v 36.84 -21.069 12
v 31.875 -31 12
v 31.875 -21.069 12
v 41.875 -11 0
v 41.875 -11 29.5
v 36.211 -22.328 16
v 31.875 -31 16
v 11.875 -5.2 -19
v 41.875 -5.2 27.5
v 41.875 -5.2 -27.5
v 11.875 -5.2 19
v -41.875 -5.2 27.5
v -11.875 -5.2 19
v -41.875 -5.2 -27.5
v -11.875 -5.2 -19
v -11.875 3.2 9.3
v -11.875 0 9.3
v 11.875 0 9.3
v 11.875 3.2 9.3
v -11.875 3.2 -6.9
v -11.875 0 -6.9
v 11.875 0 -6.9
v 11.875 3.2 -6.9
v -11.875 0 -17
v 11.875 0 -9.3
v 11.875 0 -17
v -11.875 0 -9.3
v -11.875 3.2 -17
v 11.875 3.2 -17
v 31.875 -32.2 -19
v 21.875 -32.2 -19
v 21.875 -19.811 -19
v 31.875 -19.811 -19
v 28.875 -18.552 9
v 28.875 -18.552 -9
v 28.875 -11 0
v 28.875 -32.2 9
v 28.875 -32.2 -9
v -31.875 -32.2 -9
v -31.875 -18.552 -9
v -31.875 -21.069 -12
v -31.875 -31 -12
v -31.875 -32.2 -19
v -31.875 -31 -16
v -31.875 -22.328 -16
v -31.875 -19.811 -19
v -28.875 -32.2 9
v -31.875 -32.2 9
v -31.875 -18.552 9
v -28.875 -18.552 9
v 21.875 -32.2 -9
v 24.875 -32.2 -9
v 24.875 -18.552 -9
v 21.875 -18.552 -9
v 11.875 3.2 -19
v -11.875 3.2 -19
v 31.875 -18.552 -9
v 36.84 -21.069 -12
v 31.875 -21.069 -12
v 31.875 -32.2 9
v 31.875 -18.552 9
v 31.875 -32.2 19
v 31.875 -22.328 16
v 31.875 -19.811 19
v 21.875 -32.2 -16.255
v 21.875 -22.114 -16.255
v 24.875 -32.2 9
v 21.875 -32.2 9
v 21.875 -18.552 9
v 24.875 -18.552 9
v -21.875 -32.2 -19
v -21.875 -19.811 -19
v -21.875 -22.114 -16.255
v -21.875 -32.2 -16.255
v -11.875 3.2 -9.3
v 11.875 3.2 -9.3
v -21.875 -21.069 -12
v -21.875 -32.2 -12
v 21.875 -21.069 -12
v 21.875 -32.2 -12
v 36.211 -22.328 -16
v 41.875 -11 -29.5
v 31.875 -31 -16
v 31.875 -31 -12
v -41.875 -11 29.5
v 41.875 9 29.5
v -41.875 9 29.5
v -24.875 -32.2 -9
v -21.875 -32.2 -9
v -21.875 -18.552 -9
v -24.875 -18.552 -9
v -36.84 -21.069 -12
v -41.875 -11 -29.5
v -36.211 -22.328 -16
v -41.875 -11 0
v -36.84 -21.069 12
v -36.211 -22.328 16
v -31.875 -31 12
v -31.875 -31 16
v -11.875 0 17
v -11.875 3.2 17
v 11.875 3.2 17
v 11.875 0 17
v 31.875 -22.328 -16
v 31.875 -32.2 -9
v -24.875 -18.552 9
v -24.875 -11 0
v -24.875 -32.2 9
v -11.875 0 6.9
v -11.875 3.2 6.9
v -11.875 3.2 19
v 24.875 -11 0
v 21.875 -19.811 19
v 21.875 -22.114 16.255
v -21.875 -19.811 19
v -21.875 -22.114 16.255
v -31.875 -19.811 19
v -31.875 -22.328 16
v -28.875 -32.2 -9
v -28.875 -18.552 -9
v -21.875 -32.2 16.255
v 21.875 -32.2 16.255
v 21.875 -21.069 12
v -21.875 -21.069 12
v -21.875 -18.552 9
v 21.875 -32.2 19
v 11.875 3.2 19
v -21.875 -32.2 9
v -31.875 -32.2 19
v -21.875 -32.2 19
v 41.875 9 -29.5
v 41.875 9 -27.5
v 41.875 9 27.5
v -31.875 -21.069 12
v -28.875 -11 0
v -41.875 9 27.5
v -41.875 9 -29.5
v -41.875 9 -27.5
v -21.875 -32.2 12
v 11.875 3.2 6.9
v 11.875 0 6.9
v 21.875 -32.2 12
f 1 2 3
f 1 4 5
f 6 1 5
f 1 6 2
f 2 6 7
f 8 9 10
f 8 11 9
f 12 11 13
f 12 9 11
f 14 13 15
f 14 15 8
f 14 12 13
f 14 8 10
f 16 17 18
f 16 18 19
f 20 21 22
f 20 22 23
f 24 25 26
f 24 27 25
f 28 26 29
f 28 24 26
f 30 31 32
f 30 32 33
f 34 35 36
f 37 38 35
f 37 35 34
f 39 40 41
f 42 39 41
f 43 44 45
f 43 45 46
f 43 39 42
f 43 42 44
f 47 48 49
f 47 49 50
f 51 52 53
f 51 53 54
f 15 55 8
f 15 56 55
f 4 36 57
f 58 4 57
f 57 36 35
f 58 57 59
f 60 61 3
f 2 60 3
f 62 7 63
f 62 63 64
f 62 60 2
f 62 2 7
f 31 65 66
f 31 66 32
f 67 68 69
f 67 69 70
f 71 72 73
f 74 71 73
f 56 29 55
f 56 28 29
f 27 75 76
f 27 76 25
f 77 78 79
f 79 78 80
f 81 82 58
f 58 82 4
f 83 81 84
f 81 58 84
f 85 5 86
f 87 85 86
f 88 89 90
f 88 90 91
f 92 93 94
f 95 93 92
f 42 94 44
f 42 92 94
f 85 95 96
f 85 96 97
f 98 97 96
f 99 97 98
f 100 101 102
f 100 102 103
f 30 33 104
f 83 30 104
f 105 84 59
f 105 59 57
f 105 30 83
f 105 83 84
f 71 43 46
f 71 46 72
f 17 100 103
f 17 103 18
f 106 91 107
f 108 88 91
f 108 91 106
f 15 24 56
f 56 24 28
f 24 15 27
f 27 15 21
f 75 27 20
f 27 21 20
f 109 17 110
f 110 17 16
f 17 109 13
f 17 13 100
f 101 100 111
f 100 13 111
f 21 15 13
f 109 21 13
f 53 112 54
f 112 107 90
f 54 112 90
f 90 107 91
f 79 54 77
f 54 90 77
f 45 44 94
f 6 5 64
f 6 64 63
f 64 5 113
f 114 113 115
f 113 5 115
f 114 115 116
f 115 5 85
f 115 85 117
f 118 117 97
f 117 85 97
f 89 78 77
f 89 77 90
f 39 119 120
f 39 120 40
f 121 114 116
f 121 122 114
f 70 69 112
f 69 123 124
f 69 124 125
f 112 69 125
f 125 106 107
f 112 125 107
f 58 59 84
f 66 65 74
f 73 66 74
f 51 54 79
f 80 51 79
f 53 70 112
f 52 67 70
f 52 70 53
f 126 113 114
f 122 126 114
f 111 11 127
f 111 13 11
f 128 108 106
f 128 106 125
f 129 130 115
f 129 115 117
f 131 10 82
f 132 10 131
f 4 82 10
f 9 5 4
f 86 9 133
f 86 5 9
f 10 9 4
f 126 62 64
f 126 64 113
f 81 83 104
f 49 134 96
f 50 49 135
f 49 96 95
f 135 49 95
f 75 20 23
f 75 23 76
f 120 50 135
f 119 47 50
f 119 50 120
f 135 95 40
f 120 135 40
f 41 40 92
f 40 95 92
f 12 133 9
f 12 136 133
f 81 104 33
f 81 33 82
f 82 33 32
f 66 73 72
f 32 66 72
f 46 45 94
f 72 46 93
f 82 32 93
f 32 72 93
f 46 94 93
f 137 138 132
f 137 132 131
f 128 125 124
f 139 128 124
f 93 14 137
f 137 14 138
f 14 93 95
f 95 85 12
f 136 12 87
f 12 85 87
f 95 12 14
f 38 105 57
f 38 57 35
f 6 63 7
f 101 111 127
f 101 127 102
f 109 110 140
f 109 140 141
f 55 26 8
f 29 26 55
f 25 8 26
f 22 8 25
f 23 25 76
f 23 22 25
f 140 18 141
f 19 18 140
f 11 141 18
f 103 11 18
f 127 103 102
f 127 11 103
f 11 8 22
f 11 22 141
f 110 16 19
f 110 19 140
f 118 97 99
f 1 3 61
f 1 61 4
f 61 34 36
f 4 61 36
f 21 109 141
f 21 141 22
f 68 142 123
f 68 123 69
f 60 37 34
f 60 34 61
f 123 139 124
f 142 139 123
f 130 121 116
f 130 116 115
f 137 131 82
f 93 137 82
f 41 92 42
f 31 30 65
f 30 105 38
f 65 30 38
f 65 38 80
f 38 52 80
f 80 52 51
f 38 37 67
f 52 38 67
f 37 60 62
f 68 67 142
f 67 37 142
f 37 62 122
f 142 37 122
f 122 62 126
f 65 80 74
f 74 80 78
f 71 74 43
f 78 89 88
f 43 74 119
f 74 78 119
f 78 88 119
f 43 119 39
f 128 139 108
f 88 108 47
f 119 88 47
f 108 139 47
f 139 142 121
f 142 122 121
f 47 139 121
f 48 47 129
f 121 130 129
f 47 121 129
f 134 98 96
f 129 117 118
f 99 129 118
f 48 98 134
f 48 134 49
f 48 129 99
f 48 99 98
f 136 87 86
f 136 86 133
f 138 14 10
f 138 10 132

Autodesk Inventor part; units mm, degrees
ref_plane "YZ Plane" through (0, 0, 0) normal (1, 0, 0) x (0, 1, 0)
ref_plane "XY Plane" through (0, 0, 0) normal (0, 0, 1) x (1, 0, 0)
sketch "スケッチ1" plane through (0, 0, 0) normal (1, 0, 0) x (0, 1, 0)
  line L0 (0, 41.3) -> (0, -41.3) projected
  line L1 (-39, 0) -> (17, 0) projected
  line L2 (-5.2, 19) -> (3.2, 19)
  line L3 (3.2, 19) -> (3.2, 17)
  line L4 (3.2, 17) -> (0, 17)
  line L5 (0, 17) -> (0, 9.3)
  line L6 (0, 9.3) -> (3.2, 9.3)
  line L7 (3.2, 9.3) -> (3.2, 6.9)
  line L8 (3.2, 6.9) -> (0, 6.9)
  line L9 (0, 6.9) -> (0, -6.9)
  line L10 (0, -6.9) -> (3.2, -6.9)
  line L11 (3.2, -6.9) -> (3.2, -9.3)
  line L12 (3.2, -9.3) -> (0, -9.3)
  line L13 (0, -9.3) -> (0, -17)
  line L14 (0, -17) -> (3.2, -17)
  line L15 (3.2, -17) -> (3.2, -19)
  line L16 (3.2, -19) -> (-5.2, -19)
  line L17 (-5.2, -19) -> (-5.2, 19)
  line L18 (-5.2, 27.5) -> (-5.2, -27.5)
  line L19 (-5.2, -27.5) -> (9, -27.5)
  line L20 (9, -27.5) -> (9, -29.5)
  line L21 (9, -29.5) -> (-11, -29.5)
  line L22 (-11, -29.5) -> (-11, 29.5)
  line L23 (-11, 29.5) -> (9, 29.5)
  line L24 (9, 29.5) -> (9, 27.5)
  line L25 (9, 27.5) -> (-5.2, 27.5)
  line L26 (-11, 29.5) -> (-22.3278, 16)
  line L27 (-22.3278, 16) -> (-31, 16)
  line L28 (-31, 16) -> (-31, 12)
  line L29 (-31, 12) -> (-21.0692, 12)
  line L30 (-21.0692, 12) -> (-11, 0)
  line L31 (-11, 0) -> (-21.0692, -12)
  line L32 (-21.0692, -12) -> (-31, -12)
  line L33 (-31, -12) -> (-31, -16)
  line L34 (-31, -16) -> (-22.3278, -16)
  line L35 (-22.3278, -16) -> (-11, -29.5)
  point P0 (0, 0)
  dimension "d0" = 38
  dimension "d1" = 18.6
  dimension "d2" = 2
  dimension "d3" = 2.4
  dimension "d4" = 3.2
  dimension "d5" = 8.4
  dimension "d6" = 59
  dimension "d7" = 2
  dimension "d8" = 20
  dimension "d9" = 5.8
  dimension "d10" = 5.8
  dimension "d11" = 40
  dimension "d12" = 40
  dimension "d13" = 32
  dimension "d14" = 4
  dimension "d15" = 20
extrude "押し出し1" add sketch "スケッチ1" along normal mid plane 23.75 contours L0 L1 L17 L2 | L0 L2 L3 L4 | L6 L7 L8 L0 | L0 L16 L17 L1 | L10 L11 L12 L0 | L0 L14 L15 L16
extrude "押し出し2" add sketch "スケッチ1" along normal mid plane 83.75 contours L25 L18 L17 L1 L22 L23 L0 | L0 L23 L24 L25 | L17 L18 L19 L0 L21 L22 L1 | L22 L30 L29 L28 L27 L26 | L22 L35 L34 L33 L32 L31 | L0 L19 L20 L21
ref_plane "作業平面1" through (0, -32.2, 0) normal (0, 1, 0) x (-1, 0, 0)
sketch "スケッチ2" plane through (0, -32.2, 0) normal (0, 1, 0) x (-1, 0, 0)
  line L0 (0, -41.3) -> (0, 41.3) projected
  line L1 (-58.625, 0) -> (58.625, 0) projected
  line L2 (31.875, -19) -> (21.875, -19)
  line L3 (21.875, -19) -> (21.875, -9)
  line L4 (21.875, -9) -> (31.875, -9)
  line L5 (31.875, -9) -> (31.875, -19)
  line L6 (-21.875, -19) -> (-31.875, -19)
  line L7 (-31.875, -19) -> (-31.875, -9)
  line L8 (-31.875, -9) -> (-21.875, -9)
  line L9 (-21.875, -9) -> (-21.875, -19)
  line L10 (31.875, 9) -> (21.875, 9)
  line L11 (21.875, 9) -> (21.875, 19)
  line L12 (21.875, 19) -> (31.875, 19)
  line L13 (31.875, 19) -> (31.875, 9)
  line L14 (-21.875, 9) -> (-31.875, 9)
  line L15 (-31.875, 9) -> (-31.875, 19)
  line L16 (-31.875, 19) -> (-21.875, 19)
  line L17 (-21.875, 19) -> (-21.875, 9)
  line L18 (-21.875, 16.2551) -> (21.875, 16.2551)
  line L19 (21.875, 16.2551) -> (21.875, 12)
  line L20 (21.875, 12) -> (-21.875, 12)
  line L21 (-21.875, 12) -> (-21.875, 16.2551)
  line L22 (21.875, -12) -> (-21.875, -12)
  line L23 (-21.875, -12) -> (-21.875, -16.2551)
  line L24 (-21.875, -16.2551) -> (21.875, -16.2551)
  line L25 (21.875, -16.2551) -> (21.875, -12)
  line L26 (-28.875, 9) -> (-24.875, 9)
  line L27 (-24.875, 9) -> (-24.875, -9)
  line L28 (-24.875, -9) -> (-28.875, -9)
  line L29 (-28.875, -9) -> (-28.875, 9)
  line L30 (24.875, 9) -> (28.875, 9)
  line L31 (28.875, 9) -> (28.875, -9)
  line L32 (28.875, -9) -> (24.875, -9)
  line L33 (24.875, -9) -> (24.875, 9)
  point P0 (0, 0)
  dimension "d21" = 38
  dimension "d23" = 53.75
  dimension "d24" = 10
  dimension "d25" = 10
  dimension "d28" = 3
  dimension "d29" = 3
  dimension "d30" = 3
  dimension "d31" = 2.7449
extrude "押し出し3" add sketch "スケッチ2" along normal up to next contours L24 L9 L22 L0 | L0 L22 L3 L24 | L9 L6 L7 L8 | L3 L4 L5 L2 | L20 L17 L18 L0 | L0 L18 L11 L20 | L27 L8 L29 L1 | L1 L29 L14 L27 | L33 L10 L31 L1 | L1 L31 L4 L33 | L11 L12 L13 L10 | L17 L14 L15 L16
sketch "スケッチ3" plane through (0, 0, 0) normal (0, 0, 1) x (1, 0, 0)
  line L0 (-41.875, -11) -> (-31.875, -31)
  line L1 (-31.875, -31) -> (-41.875, -31)
  line L2 (-41.875, -31) -> (-41.875, -11)
  line L3 (0, 17.24) -> (0, -40.44) projected
  line L4 (41.875, -11) -> (31.875, -31)
  line L5 (31.875, -31) -> (41.875, -31)
  line L6 (41.875, -31) -> (41.875, -11)
  point P0 (0, 0)
extrude "押し出し4" cut sketch "スケッチ3" against normal through all both and the other way through all
equation "\"d0\" = RailWidth"
equation "\"d1\" = InsideWidth"
equation "\"d2\" = OuterWall"
equation "\"d3\" = InnerWall"
equation "\"d4\" = RailDepth"
equation "\"d5\" = RailHeight"
equation "\"d9\" = d10"
equation "\"d16\" = Length - 2 * ConnectorLength"
equation "\"d21\" = RailWidth"
equation "\"d23\" = Length"
equation "\"d29\" = d28"
equation "\"d30\" = d28"
equation "\"Length\" = 0.25 * StraightLength"
equation "\"RailWidth\" = 38"
equation "\"InsideWidth\" = 18.6"
equation "\"OuterWall\" = 2"
equation "\"InnerWall\" = 2.4"
equation "\"RailDepth\" = 3.2"
equation "\"RailHeight\" = 8.4"
equation "\"ConnectorLength\" = 15"
equation "\"StraightLength\" = 215"
properties part number "Viaduct_HorizontalSingle"
